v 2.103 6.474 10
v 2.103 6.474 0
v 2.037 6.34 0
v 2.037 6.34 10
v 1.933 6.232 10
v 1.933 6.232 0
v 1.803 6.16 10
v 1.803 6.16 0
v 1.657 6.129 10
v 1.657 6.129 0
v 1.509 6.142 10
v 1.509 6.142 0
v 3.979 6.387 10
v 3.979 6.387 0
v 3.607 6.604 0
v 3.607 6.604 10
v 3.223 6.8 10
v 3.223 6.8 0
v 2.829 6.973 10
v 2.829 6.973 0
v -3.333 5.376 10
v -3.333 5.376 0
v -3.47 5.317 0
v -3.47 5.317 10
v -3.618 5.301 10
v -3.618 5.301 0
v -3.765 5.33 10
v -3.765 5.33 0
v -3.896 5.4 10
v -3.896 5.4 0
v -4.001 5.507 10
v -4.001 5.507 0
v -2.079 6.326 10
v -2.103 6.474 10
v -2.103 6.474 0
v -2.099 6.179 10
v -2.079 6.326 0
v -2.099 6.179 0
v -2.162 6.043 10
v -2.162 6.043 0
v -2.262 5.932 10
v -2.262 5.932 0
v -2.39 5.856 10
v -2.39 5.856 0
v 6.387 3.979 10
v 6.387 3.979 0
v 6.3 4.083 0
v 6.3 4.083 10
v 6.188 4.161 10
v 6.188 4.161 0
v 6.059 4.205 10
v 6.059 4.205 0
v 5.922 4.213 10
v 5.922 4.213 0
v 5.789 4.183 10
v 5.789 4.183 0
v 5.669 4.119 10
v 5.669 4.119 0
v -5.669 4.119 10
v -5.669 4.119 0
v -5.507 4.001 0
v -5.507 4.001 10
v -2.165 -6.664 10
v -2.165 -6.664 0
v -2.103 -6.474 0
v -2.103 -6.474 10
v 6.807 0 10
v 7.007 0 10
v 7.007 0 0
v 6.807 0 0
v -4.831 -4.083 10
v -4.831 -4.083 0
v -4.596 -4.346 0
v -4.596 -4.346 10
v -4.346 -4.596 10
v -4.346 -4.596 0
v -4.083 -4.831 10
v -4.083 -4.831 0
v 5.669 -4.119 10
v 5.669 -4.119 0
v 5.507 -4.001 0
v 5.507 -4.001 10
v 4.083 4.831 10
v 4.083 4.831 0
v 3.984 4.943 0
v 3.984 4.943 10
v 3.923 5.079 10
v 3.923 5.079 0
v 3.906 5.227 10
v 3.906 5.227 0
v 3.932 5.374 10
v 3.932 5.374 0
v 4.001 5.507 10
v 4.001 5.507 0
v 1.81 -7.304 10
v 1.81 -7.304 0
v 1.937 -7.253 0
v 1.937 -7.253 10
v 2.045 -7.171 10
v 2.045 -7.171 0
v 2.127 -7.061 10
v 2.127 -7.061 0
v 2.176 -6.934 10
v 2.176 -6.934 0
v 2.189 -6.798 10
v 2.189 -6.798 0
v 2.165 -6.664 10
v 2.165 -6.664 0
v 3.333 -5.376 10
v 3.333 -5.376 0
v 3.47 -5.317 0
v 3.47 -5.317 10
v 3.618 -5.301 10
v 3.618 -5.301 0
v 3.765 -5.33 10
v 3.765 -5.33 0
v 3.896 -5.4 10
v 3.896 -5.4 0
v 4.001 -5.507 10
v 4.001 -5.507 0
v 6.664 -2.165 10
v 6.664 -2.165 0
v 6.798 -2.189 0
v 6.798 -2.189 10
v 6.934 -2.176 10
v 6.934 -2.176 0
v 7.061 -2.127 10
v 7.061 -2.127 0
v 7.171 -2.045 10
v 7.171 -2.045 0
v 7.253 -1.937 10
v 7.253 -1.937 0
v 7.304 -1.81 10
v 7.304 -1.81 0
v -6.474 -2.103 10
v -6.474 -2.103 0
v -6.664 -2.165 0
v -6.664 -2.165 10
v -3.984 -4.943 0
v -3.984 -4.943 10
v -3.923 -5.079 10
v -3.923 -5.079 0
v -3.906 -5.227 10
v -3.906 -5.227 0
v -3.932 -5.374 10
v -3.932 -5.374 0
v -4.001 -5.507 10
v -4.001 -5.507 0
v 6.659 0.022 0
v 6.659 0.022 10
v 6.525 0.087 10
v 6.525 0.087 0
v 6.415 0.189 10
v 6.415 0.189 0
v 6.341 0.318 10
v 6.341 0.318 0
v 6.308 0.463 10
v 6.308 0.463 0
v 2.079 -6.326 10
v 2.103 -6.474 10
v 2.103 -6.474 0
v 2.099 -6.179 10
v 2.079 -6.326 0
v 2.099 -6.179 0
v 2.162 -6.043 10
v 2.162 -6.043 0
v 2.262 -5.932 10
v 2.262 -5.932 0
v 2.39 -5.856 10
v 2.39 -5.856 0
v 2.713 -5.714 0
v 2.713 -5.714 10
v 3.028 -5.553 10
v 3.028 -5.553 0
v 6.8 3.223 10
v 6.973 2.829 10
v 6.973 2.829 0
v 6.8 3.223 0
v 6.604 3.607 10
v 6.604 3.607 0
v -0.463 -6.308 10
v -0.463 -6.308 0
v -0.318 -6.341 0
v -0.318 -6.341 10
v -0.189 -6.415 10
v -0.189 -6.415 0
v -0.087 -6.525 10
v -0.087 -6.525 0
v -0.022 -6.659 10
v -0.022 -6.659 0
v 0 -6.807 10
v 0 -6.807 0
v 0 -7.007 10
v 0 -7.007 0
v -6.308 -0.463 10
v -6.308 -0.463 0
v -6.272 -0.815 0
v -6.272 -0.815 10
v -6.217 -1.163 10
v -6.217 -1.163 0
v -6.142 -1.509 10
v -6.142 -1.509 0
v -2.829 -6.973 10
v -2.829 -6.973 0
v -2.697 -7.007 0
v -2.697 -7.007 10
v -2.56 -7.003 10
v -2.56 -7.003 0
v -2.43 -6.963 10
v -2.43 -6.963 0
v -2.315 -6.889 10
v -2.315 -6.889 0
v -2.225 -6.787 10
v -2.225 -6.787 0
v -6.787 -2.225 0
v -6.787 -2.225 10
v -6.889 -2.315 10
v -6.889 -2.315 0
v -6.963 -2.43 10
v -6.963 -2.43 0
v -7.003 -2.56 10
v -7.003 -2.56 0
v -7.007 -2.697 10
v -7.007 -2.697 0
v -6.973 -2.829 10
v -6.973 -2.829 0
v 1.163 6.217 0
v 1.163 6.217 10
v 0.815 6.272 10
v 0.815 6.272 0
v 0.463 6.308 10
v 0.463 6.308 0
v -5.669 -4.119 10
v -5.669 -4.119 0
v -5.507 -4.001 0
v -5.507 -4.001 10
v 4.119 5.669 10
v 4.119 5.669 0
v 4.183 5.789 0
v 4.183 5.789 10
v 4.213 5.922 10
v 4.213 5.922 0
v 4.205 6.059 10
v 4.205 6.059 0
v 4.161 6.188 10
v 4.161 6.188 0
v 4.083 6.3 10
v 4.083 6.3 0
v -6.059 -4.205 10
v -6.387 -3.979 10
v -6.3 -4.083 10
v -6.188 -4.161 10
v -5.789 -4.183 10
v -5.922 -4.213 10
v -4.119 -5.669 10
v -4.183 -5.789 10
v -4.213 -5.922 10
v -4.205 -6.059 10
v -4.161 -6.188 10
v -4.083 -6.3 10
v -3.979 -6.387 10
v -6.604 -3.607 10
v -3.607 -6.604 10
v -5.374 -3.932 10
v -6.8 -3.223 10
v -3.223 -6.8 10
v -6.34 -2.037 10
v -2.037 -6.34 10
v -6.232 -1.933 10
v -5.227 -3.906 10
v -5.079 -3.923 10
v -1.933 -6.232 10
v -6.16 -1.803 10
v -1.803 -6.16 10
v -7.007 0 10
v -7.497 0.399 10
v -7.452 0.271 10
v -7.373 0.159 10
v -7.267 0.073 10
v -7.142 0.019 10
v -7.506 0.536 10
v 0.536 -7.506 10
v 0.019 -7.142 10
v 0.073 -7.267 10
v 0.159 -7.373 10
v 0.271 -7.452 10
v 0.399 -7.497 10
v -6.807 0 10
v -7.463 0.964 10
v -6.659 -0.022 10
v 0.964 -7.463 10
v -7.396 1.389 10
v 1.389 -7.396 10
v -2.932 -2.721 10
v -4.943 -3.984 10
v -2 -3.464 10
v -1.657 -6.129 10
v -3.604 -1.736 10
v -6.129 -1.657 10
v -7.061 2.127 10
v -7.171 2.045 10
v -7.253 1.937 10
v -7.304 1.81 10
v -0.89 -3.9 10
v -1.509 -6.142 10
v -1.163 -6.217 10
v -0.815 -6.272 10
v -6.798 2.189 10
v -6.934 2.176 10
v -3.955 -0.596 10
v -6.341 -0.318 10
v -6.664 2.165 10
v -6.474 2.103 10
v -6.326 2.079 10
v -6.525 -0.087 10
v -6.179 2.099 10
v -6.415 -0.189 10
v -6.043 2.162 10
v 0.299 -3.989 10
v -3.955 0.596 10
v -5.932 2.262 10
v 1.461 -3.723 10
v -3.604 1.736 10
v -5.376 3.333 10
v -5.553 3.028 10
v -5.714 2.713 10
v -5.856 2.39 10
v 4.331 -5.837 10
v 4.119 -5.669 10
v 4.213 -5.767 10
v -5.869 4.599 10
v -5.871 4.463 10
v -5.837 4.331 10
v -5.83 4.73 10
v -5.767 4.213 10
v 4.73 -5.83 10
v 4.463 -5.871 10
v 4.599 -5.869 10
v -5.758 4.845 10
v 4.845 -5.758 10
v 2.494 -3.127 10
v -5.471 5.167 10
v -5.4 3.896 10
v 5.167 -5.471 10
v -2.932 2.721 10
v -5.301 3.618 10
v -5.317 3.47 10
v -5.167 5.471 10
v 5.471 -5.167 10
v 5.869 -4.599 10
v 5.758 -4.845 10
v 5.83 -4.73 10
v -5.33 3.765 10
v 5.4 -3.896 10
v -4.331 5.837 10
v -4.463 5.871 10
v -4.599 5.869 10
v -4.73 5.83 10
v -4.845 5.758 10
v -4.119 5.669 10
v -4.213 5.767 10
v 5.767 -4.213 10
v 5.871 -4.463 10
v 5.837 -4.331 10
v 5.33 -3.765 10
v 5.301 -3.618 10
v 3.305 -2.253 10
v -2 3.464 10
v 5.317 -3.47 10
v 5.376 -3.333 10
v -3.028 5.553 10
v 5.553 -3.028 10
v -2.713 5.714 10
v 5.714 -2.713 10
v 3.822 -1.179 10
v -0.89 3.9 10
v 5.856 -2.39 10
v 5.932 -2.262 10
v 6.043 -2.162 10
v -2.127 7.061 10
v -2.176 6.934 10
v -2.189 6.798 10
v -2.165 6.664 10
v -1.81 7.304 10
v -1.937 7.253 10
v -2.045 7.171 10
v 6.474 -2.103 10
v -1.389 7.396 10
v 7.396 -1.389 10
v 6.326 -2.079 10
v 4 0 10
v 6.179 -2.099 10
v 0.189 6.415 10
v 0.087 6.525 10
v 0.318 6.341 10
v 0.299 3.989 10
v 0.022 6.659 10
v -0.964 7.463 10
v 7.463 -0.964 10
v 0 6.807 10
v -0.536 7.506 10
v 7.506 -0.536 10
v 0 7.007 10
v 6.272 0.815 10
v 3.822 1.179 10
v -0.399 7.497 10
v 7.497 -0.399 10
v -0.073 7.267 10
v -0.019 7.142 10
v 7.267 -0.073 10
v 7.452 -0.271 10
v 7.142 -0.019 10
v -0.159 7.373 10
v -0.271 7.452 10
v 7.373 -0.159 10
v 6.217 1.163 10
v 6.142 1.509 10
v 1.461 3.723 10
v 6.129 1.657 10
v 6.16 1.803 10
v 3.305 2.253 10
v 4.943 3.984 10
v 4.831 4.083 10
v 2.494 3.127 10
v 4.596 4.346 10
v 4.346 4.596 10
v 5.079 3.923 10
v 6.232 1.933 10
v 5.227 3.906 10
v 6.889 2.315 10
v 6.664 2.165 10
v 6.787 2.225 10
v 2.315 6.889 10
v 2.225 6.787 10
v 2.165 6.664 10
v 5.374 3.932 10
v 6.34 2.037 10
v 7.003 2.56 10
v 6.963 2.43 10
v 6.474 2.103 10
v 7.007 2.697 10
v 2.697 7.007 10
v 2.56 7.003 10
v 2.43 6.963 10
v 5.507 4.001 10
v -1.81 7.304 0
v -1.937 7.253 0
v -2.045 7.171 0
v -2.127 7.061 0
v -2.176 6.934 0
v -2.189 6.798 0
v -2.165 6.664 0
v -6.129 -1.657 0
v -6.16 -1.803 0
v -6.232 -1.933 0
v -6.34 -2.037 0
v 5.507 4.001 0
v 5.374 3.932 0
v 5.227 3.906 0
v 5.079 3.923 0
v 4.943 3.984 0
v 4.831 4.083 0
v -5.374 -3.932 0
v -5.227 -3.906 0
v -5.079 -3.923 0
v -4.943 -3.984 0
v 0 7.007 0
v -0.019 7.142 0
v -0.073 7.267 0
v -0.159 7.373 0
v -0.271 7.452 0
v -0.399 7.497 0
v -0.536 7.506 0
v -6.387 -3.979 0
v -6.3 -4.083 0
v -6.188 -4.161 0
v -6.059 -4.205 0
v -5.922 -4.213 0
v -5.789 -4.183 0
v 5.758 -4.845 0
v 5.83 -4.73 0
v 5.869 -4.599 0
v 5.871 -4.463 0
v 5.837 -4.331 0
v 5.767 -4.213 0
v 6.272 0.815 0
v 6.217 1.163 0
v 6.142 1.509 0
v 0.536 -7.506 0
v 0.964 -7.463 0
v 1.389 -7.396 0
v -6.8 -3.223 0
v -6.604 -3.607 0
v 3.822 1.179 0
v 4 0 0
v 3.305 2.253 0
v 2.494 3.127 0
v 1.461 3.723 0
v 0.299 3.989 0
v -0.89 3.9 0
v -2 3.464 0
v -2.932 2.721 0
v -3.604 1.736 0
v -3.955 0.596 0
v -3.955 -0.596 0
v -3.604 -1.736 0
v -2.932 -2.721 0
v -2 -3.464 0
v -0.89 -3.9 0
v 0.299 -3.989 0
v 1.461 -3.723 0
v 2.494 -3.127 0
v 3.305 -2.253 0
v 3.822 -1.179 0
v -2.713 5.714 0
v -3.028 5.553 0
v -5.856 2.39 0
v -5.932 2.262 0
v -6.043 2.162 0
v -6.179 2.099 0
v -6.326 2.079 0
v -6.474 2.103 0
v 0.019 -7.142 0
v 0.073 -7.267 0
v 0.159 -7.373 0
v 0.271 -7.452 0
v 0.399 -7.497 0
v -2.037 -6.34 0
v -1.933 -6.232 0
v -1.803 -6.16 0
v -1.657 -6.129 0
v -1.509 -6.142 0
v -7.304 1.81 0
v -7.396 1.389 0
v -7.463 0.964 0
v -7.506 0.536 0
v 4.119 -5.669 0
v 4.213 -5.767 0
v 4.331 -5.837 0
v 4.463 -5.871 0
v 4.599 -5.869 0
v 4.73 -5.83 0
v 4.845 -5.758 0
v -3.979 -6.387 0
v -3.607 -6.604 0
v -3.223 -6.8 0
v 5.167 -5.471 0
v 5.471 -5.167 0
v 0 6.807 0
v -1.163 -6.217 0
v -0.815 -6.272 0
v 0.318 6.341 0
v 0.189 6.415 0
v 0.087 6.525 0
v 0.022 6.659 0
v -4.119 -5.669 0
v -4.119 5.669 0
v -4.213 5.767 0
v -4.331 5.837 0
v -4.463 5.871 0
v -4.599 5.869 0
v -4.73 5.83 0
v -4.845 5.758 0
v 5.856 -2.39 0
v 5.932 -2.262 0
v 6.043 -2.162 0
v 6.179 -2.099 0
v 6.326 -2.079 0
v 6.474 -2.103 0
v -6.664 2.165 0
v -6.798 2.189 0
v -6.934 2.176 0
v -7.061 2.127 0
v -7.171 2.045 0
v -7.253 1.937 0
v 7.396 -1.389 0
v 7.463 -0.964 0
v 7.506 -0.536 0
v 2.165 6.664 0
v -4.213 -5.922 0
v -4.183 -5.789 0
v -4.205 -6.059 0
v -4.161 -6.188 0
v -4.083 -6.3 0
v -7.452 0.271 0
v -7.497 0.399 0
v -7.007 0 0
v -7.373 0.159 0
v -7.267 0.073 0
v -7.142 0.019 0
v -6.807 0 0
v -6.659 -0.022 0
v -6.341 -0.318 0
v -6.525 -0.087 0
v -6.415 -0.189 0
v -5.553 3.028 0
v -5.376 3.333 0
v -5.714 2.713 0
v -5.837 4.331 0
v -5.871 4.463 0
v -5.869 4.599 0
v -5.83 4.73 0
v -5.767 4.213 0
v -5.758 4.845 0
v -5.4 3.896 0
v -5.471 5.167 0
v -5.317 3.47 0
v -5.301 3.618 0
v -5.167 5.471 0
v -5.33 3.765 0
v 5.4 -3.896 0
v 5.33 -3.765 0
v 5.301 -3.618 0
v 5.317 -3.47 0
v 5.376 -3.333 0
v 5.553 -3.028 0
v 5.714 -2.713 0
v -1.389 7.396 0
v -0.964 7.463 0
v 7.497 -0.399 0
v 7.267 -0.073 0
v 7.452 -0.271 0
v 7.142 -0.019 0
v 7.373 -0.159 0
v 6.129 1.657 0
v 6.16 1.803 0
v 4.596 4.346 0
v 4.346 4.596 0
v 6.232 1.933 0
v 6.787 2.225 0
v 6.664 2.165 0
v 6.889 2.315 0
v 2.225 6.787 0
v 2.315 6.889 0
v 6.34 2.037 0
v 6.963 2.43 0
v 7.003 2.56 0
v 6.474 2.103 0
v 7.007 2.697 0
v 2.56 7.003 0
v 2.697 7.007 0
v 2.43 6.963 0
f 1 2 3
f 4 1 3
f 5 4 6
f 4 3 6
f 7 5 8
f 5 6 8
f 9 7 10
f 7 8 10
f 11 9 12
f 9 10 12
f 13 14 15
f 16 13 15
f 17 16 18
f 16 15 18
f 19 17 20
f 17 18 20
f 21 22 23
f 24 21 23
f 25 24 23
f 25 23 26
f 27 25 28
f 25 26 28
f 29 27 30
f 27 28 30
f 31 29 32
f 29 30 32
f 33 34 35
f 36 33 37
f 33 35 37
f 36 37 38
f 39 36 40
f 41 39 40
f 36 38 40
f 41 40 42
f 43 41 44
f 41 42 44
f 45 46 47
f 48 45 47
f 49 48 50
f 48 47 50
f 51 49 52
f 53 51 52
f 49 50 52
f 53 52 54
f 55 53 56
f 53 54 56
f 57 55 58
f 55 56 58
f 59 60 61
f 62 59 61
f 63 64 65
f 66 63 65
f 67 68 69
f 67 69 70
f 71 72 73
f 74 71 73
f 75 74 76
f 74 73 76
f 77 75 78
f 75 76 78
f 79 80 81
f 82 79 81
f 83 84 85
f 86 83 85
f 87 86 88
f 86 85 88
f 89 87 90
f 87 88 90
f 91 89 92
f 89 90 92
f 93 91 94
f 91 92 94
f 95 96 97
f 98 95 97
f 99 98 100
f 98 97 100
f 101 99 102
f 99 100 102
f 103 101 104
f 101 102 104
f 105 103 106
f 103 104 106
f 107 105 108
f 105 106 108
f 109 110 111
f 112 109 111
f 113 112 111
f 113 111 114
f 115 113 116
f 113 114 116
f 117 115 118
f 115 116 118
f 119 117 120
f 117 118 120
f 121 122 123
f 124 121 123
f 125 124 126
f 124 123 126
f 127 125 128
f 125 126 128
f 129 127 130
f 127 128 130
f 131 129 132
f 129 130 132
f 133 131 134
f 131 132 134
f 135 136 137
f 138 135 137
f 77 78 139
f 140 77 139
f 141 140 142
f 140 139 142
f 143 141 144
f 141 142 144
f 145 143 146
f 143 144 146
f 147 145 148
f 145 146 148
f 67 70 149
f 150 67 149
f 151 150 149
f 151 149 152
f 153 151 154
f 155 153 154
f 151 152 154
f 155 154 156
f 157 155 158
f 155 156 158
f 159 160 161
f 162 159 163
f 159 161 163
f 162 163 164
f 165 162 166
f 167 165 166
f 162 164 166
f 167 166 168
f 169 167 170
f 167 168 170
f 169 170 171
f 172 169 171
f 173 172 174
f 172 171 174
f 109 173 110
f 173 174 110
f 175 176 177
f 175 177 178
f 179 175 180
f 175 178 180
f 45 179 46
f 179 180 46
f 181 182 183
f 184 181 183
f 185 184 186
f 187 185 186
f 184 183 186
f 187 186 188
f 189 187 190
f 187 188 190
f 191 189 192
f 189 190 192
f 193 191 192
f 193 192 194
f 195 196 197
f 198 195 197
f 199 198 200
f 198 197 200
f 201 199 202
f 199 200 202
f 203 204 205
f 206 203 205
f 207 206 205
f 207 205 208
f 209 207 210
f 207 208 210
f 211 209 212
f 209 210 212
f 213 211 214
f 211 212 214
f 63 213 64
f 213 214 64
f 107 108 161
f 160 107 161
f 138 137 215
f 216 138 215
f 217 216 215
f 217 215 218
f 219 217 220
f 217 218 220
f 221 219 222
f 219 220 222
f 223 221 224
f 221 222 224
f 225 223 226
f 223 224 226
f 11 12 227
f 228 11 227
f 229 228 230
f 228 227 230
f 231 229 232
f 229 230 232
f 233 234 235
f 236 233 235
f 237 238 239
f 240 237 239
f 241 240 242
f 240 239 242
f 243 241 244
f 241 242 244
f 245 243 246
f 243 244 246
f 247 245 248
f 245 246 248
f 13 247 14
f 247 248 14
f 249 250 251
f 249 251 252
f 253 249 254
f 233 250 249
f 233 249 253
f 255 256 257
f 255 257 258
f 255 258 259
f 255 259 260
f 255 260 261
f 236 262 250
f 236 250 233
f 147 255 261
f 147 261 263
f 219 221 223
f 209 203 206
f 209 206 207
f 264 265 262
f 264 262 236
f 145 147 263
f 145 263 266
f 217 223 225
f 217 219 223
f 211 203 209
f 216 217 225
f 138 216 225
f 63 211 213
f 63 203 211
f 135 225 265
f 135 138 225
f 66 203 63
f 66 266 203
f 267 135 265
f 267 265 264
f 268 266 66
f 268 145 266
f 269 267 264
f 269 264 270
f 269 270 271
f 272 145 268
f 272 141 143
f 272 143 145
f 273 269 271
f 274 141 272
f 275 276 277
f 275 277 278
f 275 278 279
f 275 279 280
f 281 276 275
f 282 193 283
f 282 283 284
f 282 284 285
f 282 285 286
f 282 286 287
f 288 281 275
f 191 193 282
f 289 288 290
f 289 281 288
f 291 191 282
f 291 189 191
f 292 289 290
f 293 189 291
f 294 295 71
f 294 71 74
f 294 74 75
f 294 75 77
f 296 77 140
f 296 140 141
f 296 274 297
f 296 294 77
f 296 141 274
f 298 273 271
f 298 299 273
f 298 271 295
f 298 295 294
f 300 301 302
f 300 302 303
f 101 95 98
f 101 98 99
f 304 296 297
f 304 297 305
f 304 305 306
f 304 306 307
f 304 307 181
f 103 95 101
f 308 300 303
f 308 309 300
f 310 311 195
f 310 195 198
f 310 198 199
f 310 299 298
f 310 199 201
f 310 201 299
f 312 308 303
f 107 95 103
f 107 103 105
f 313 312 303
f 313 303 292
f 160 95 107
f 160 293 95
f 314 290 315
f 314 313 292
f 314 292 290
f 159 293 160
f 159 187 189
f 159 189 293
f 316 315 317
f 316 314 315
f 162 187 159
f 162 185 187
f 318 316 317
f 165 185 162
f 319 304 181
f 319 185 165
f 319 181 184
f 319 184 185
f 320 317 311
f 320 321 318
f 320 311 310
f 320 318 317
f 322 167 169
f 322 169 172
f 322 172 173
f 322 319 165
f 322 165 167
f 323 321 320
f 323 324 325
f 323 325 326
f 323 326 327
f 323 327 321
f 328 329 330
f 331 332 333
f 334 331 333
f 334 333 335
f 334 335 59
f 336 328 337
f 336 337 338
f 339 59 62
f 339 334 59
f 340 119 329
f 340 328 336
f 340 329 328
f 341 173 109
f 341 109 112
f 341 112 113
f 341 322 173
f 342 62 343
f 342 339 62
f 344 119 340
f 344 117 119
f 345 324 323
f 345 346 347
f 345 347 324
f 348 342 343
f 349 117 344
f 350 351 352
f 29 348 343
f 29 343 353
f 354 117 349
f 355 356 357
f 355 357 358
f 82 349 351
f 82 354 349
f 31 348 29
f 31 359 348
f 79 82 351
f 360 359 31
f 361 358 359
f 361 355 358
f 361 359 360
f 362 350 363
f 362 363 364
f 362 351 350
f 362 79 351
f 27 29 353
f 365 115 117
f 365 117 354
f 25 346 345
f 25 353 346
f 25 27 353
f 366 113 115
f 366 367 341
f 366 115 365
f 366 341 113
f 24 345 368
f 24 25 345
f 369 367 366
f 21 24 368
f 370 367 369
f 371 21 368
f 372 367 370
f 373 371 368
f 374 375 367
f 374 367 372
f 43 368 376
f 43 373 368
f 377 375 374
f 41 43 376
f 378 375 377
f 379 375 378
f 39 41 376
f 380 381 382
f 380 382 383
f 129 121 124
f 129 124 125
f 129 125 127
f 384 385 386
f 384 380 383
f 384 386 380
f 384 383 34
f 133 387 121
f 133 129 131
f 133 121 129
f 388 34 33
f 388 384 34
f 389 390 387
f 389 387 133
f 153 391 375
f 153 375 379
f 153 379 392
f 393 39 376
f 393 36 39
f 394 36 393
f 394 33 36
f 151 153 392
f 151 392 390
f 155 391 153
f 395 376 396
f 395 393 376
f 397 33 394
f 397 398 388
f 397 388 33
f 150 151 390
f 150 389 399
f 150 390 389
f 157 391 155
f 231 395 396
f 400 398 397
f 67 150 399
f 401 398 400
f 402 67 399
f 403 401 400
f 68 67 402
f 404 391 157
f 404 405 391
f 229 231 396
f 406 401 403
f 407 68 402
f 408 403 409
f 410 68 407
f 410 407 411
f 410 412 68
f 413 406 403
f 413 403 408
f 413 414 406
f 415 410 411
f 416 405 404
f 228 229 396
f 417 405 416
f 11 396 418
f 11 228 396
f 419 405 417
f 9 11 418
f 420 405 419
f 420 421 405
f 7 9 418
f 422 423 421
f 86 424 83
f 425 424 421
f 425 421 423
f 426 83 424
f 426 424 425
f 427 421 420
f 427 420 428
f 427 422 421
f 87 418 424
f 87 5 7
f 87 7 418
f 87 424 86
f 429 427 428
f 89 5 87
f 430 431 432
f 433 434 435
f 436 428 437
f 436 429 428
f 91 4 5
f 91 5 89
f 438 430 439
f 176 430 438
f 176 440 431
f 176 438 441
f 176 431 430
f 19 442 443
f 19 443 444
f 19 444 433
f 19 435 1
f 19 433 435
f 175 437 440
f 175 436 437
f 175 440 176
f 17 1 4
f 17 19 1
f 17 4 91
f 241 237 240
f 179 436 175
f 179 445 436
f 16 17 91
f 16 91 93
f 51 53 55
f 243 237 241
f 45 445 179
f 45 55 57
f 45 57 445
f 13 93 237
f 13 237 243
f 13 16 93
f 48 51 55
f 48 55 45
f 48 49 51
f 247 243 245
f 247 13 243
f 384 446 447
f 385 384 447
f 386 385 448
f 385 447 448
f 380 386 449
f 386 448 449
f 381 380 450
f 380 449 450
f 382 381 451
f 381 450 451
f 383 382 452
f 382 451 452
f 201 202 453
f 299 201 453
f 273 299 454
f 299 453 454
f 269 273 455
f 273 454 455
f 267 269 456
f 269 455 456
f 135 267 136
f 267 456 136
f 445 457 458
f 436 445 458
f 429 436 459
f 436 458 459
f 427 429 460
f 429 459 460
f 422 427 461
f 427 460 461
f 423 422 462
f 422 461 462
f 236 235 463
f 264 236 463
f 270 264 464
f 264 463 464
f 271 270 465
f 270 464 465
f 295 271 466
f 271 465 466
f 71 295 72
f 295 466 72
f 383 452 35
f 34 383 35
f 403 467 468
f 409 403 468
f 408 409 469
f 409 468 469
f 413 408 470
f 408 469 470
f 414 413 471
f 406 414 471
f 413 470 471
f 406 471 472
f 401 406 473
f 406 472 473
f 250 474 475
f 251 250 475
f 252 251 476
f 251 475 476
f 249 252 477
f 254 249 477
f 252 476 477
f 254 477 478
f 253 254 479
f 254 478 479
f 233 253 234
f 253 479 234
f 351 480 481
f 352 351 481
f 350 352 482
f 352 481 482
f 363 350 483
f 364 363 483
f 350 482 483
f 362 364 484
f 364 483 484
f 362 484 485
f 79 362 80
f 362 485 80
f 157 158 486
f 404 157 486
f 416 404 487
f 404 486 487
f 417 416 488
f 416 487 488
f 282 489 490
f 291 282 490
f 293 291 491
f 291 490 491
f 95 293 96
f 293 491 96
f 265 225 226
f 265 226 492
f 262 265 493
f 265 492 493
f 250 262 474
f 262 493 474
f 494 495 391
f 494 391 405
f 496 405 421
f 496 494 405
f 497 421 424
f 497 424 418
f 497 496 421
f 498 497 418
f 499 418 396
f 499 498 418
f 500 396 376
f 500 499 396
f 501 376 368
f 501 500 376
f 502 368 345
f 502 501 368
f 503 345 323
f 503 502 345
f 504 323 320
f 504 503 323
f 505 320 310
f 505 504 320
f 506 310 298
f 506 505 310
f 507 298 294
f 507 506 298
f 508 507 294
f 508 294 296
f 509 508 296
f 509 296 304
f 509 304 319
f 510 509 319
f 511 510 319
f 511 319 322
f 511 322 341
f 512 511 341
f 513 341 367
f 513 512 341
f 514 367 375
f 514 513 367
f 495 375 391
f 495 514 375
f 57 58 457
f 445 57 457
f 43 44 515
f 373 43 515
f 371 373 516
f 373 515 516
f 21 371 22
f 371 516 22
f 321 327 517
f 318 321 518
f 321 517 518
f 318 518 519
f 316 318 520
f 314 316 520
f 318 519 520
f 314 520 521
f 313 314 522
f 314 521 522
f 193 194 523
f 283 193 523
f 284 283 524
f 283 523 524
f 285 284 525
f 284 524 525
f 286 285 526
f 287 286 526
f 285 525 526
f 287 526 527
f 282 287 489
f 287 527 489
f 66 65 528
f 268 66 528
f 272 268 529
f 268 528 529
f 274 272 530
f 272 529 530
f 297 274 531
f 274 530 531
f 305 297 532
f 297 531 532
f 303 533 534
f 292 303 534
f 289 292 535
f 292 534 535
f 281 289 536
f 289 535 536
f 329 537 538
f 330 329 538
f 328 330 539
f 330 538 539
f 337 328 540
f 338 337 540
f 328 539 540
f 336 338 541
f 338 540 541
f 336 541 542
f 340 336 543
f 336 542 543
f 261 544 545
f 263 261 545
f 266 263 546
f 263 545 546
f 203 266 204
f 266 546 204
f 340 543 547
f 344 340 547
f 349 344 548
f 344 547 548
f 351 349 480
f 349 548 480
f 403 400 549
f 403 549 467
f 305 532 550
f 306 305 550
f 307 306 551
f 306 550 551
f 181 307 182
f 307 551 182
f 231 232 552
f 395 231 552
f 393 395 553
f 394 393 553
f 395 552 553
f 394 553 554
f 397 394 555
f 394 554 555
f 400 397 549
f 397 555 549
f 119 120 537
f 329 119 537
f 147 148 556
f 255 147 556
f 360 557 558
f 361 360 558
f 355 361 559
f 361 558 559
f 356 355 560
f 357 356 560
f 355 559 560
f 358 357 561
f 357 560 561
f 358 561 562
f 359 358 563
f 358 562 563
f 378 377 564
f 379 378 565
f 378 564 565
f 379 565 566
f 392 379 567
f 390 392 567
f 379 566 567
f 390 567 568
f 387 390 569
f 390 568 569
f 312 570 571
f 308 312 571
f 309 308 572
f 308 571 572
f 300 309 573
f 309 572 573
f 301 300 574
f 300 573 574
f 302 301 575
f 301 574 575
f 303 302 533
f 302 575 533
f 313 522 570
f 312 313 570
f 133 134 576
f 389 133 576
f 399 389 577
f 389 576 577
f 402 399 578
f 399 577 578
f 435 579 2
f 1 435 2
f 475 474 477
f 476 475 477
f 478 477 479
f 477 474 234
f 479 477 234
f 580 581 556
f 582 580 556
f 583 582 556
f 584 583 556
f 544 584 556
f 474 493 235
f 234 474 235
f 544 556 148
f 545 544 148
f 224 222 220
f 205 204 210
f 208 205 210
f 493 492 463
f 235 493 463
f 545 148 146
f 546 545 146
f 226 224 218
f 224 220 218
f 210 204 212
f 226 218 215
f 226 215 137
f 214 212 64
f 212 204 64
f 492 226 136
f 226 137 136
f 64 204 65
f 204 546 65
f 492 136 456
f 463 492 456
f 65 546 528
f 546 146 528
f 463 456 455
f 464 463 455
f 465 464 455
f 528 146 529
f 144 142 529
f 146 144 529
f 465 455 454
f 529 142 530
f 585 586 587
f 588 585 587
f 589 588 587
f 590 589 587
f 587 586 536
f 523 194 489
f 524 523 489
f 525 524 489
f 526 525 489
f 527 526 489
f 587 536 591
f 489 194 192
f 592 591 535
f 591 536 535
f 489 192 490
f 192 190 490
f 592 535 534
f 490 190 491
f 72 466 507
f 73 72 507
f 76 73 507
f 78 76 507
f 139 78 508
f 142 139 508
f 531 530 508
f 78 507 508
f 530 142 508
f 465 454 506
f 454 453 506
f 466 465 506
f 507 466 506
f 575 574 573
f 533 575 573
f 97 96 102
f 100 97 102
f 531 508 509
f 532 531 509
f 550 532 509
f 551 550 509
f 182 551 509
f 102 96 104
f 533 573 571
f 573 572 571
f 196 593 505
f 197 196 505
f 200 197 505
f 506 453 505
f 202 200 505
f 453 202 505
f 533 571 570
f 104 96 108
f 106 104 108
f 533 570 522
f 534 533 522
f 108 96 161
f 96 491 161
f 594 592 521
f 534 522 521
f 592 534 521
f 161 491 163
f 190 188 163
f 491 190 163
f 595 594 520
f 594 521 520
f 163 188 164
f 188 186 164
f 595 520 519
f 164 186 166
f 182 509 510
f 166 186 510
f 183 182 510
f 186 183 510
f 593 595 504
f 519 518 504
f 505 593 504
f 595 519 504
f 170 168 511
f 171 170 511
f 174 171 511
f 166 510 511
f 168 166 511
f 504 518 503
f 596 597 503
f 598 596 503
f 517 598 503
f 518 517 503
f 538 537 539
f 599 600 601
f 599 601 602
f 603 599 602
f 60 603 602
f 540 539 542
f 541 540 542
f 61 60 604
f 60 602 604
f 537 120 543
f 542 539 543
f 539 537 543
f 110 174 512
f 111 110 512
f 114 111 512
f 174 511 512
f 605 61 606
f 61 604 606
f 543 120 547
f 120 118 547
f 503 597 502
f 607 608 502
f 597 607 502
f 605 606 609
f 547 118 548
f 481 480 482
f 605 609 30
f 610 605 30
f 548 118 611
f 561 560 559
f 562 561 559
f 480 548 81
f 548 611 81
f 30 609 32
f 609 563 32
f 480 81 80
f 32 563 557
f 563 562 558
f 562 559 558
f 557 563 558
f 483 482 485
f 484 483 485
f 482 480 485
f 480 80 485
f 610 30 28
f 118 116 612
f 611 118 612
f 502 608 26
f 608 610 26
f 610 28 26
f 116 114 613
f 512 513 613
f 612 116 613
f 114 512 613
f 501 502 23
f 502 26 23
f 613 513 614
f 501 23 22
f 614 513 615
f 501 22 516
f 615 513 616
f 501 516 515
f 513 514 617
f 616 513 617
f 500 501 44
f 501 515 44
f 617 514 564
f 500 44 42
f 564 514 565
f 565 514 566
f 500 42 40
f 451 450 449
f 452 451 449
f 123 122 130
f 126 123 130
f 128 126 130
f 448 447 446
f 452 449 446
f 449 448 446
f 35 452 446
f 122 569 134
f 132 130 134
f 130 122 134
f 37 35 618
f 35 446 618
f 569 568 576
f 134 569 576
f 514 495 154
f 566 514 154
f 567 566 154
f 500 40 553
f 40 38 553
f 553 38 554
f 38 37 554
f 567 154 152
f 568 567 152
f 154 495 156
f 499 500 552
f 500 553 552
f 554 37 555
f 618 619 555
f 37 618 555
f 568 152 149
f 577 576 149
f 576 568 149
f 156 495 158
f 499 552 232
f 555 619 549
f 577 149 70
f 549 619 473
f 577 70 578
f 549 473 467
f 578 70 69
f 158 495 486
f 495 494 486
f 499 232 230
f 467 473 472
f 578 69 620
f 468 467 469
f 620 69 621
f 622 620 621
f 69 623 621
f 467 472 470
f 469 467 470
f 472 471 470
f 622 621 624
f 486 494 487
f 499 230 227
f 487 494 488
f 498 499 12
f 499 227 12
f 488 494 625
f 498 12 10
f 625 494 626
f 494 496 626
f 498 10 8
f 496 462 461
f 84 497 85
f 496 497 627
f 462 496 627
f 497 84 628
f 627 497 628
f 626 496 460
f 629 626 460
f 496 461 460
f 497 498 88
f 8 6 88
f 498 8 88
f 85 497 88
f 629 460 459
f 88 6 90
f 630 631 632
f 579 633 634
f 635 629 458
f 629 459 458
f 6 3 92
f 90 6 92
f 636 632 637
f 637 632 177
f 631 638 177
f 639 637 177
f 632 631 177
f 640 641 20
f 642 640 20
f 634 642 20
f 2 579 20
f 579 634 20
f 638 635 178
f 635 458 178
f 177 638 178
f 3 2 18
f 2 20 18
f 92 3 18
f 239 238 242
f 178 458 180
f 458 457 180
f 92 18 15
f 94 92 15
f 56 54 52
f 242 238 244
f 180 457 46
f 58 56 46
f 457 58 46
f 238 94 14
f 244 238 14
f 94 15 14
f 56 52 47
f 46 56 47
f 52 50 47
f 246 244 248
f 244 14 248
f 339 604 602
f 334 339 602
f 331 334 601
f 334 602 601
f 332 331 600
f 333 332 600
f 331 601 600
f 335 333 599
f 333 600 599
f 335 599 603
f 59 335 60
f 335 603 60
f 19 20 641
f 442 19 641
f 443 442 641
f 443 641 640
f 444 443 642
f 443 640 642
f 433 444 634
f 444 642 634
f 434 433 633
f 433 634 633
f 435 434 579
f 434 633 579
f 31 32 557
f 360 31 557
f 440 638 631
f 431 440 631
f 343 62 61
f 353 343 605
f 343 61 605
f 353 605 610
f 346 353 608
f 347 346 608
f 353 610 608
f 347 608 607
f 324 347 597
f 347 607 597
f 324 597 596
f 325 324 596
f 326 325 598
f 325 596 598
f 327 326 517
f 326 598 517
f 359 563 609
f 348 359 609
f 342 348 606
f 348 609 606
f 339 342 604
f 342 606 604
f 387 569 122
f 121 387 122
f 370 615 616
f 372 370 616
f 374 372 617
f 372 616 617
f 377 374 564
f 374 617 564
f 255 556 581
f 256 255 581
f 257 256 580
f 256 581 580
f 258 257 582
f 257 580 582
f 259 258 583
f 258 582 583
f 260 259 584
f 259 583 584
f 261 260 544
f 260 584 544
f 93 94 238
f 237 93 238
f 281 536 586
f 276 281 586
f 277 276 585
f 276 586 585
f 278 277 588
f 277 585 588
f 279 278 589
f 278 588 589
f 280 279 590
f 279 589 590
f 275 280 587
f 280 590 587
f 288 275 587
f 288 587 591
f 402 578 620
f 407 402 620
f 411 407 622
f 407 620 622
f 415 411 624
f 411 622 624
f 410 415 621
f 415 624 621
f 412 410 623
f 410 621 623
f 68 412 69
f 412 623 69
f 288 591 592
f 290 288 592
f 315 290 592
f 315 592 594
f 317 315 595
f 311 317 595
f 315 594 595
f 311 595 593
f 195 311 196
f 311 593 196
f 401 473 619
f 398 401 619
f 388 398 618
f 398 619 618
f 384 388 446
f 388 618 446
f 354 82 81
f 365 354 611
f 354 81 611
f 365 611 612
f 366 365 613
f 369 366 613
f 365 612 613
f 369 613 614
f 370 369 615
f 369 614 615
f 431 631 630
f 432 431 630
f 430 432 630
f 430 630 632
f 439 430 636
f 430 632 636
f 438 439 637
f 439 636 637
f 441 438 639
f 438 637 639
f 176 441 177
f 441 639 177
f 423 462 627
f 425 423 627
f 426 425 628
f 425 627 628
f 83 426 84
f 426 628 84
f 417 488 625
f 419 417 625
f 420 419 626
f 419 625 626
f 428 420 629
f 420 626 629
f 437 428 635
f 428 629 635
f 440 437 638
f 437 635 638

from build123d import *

# Parameters (mm, degrees)
ESQUISSE1_R      = 4
EXTRUSION1_DEPTH = 10


with BuildPart() as part:
    # Esquisse1 → Extrusion1 (new body)
    with BuildSketch(Plane.XY):
        with BuildLine():
            Line((4.000854566, 5.506703891), (4.118719306, 5.668930788))
            ThreePointArc((4.118719306, 5.668930788), (4.204956471, 6.058576718), (3.97856745, 6.387223657))
            ThreePointArc((3.97856745, 6.387223657), (3.416278511, 6.704824095), (2.828829213, 6.973044549))
            ThreePointArc((2.828829213, 6.973044549), (2.429880127, 6.96302329), (2.165338881, 6.664227827))
            Line((2.165338881, 6.664227827), (2.10337372, 6.473518672))
            ThreePointArc((2.10337372, 6.473518672), (1.871017944, 6.191143724), (1.508589384, 6.142457413))
            ThreePointArc((1.508589384, 6.142457413), (0.989447991, 6.247128754), (0.463369963, 6.308003906))
            ThreePointArc((0.463369963, 6.308003906), (0.133724818, 6.466303924), (0, 6.806660341))
            Line((0, 6.806660341), (0, 7.007183814))
            ThreePointArc((0, 7.007183814), (-0.159260799, 7.373102927), (-0.535587189, 7.505915758))
            ThreePointArc((-0.535587189, 7.505915758), (-1.177169349, 7.432354763), (-1.810081842, 7.304055635))
            ThreePointArc((-1.810081842, 7.304055635), (-2.126948085, 7.061451877), (-2.165338881, 6.664227827))
            Line((-2.165338881, 6.664227827), (-2.10337372, 6.473518672))
            ThreePointArc((-2.10337372, 6.473518672), (-2.125377663, 6.108497242), (-2.389971431, 5.856079026))
            ThreePointArc((-2.389971431, 5.856079026), (-2.871489911, 5.635616265), (-3.332877492, 5.375644391))
            ThreePointArc((-3.332877492, 5.375644391), (-3.692612433, 5.309951241), (-4.000854566, 5.506703891))
            Line((-4.000854566, 5.506703891), (-4.118719306, 5.668930788))
            ThreePointArc((-4.118719306, 5.668930788), (-4.462645857, 5.87135442), (-4.845165725, 5.757603156))
            ThreePointArc((-4.845165725, 5.757603156), (-5.320978528, 5.320978528), (-5.757603156, 4.845165725))
            ThreePointArc((-5.757603156, 4.845165725), (-5.87135442, 4.462645857), (-5.668930788, 4.118719306))
            Line((-5.668930788, 4.118719306), (-5.506703891, 4.000854566))
            ThreePointArc((-5.506703891, 4.000854566), (-5.309951241, 3.692612433), (-5.375644391, 3.332877492))
            ThreePointArc((-5.375644391, 3.332877492), (-5.635616265, 2.871489911), (-5.856079026, 2.389971431))
            ThreePointArc((-5.856079026, 2.389971431), (-6.108497242, 2.125377663), (-6.473518672, 2.10337372))
            Line((-6.473518672, 2.10337372), (-6.664227827, 2.165338881))
            ThreePointArc((-6.664227827, 2.165338881), (-7.061451877, 2.126948085), (-7.304055635, 1.810081842))
            ThreePointArc((-7.304055635, 1.810081842), (-7.432354763, 1.177169349), (-7.505915758, 0.535587189))
            ThreePointArc((-7.505915758, 0.535587189), (-7.373102927, 0.159260799), (-7.007183814, 0))
            Line((-7.007183814, 0), (-6.806660341, 0))
            ThreePointArc((-6.806660341, 0), (-6.466303924, -0.133724818), (-6.308003906, -0.463369963))
            ThreePointArc((-6.308003906, -0.463369963), (-6.247128754, -0.989447991), (-6.142457413, -1.508589384))
            ThreePointArc((-6.142457413, -1.508589384), (-6.191143724, -1.871017944), (-6.473518672, -2.10337372))
            Line((-6.473518672, -2.10337372), (-6.664227827, -2.165338881))
            ThreePointArc((-6.664227827, -2.165338881), (-6.96302329, -2.429880127), (-6.973044549, -2.828829213))
            ThreePointArc((-6.973044549, -2.828829213), (-6.704824095, -3.416278511), (-6.387223657, -3.97856745))
            ThreePointArc((-6.387223657, -3.97856745), (-6.058576718, -4.204956471), (-5.668930788, -4.118719306))
            Line((-5.668930788, -4.118719306), (-5.506703891, -4.000854566))
            ThreePointArc((-5.506703891, -4.000854566), (-5.152748289, -3.908983733), (-4.83092033, -4.082625842))
            ThreePointArc((-4.83092033, -4.082625842), (-4.472450391, -4.472450391), (-4.082625842, -4.83092033))
            ThreePointArc((-4.082625842, -4.83092033), (-3.908983733, -5.152748289), (-4.000854566, -5.506703891))
            Line((-4.000854566, -5.506703891), (-4.118719306, -5.668930788))
            ThreePointArc((-4.118719306, -5.668930788), (-4.204956471, -6.058576718), (-3.97856745, -6.387223657))
            ThreePointArc((-3.97856745, -6.387223657), (-3.416278511, -6.704824095), (-2.828829213, -6.973044549))
            ThreePointArc((-2.828829213, -6.973044549), (-2.429880127, -6.96302329), (-2.165338881, -6.664227827))
            Line((-2.165338881, -6.664227827), (-2.10337372, -6.473518672))
            ThreePointArc((-2.10337372, -6.473518672), (-1.871017944, -6.191143724), (-1.508589384, -6.142457413))
            ThreePointArc((-1.508589384, -6.142457413), (-0.989447991, -6.247128754), (-0.463369963, -6.308003906))
            ThreePointArc((-0.463369963, -6.308003906), (-0.133724818, -6.466303924), (0, -6.806660341))
            Line((0, -6.806660341), (0, -7.007183814))
            ThreePointArc((0, -7.007183814), (0.159260799, -7.373102927), (0.535587189, -7.505915758))
            ThreePointArc((0.535587189, -7.505915758), (1.177169349, -7.432354763), (1.810081842, -7.304055635))
            ThreePointArc((1.810081842, -7.304055635), (2.126948085, -7.061451877), (2.165338881, -6.664227827))
            Line((2.165338881, -6.664227827), (2.10337372, -6.473518672))
            ThreePointArc((2.10337372, -6.473518672), (2.125377663, -6.108497242), (2.389971431, -5.856079026))
            ThreePointArc((2.389971431, -5.856079026), (2.871489911, -5.635616265), (3.332877492, -5.375644391))
            ThreePointArc((3.332877492, -5.375644391), (3.692612433, -5.309951241), (4.000854566, -5.506703891))
            Line((4.000854566, -5.506703891), (4.118719306, -5.668930788))
            ThreePointArc((4.118719306, -5.668930788), (4.462645857, -5.87135442), (4.845165725, -5.757603156))
            ThreePointArc((4.845165725, -5.757603156), (5.320978528, -5.320978528), (5.757603156, -4.845165725))
            ThreePointArc((5.757603156, -4.845165725), (5.87135442, -4.462645857), (5.668930788, -4.118719306))
            Line((5.668930788, -4.118719306), (5.506703891, -4.000854566))
            ThreePointArc((5.506703891, -4.000854566), (5.309951241, -3.692612433), (5.375644391, -3.332877492))
            ThreePointArc((5.375644391, -3.332877492), (5.635616265, -2.871489911), (5.856079026, -2.389971431))
            ThreePointArc((5.856079026, -2.389971431), (6.108497242, -2.125377663), (6.473518672, -2.10337372))
            Line((6.473518672, -2.10337372), (6.664227827, -2.165338881))
            ThreePointArc((6.664227827, -2.165338881), (7.061451877, -2.126948085), (7.304055635, -1.810081842))
            ThreePointArc((7.304055635, -1.810081842), (7.432354763, -1.177169349), (7.505915758, -0.535587189))
            ThreePointArc((7.505915758, -0.535587189), (7.373102927, -0.159260799), (7.007183814, 0))
            Line((7.007183814, 0), (6.806660341, 0))
            ThreePointArc((6.806660341, 0), (6.466303924, 0.133724818), (6.308003906, 0.463369963))
            ThreePointArc((6.308003906, 0.463369963), (6.247128754, 0.989447991), (6.142457413, 1.508589384))
            ThreePointArc((6.142457413, 1.508589384), (6.191143724, 1.871017944), (6.473518672, 2.10337372))
            Line((6.473518672, 2.10337372), (6.664227827, 2.165338881))
            ThreePointArc((6.664227827, 2.165338881), (6.96302329, 2.429880127), (6.973044549, 2.828829213))
            ThreePointArc((6.973044549, 2.828829213), (6.704824095, 3.416278511), (6.387223657, 3.97856745))
            ThreePointArc((6.387223657, 3.97856745), (6.058576718, 4.204956471), (5.668930788, 4.118719306))
            Line((5.668930788, 4.118719306), (5.506703891, 4.000854566))
            ThreePointArc((5.506703891, 4.000854566), (5.152748289, 3.908983733), (4.83092033, 4.082625842))
            ThreePointArc((4.83092033, 4.082625842), (4.472450391, 4.472450391), (4.082625842, 4.83092033))
            ThreePointArc((4.082625842, 4.83092033), (3.908983733, 5.152748289), (4.000854566, 5.506703891))
        make_face()
        Circle(ESQUISSE1_R, mode=Mode.SUBTRACT)
    extrude(amount=EXTRUSION1_DEPTH)


solid = part.part
